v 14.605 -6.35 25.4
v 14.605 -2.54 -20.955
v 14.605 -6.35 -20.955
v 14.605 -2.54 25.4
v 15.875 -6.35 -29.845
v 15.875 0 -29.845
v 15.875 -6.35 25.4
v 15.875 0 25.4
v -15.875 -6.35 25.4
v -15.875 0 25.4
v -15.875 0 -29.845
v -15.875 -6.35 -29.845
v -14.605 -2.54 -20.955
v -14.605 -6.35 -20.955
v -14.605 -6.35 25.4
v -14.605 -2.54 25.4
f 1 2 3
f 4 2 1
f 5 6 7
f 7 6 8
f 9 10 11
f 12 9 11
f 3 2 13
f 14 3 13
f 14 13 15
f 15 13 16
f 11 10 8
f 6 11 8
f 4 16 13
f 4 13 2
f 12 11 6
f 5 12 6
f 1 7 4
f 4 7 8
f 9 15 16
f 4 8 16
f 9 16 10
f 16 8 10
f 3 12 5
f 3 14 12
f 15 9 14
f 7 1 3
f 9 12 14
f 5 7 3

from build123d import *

# Parameters (mm, degrees)
F0_W     = 29.21
F0_H     = 46.355
F1_DEPTH = 2.54
F0_H_2   = 4.445
F0_W_2   = 0.635
F2_DEPTH = 6.35


with BuildPart() as f1:
    # F0 (on Front) → F1 (new body)
    with BuildSketch(Plane.XZ):
        with Locations((0, 2.2225)):
            Rectangle(F0_W, F0_H)
    extrude(amount=F1_DEPTH)

    # F0 (on Front) → F2 (join)
    with BuildSketch(Plane.XZ):
        with Locations((0, -23.1775)):
            Rectangle(F0_W, F0_H_2)
        with Locations((14.9225, -23.1775)):
            Rectangle(F0_W_2, F0_H_2)
        with Locations((-14.9225, 2.2225)):
            Rectangle(F0_W_2, F0_H)
        with Locations((-15.5575, 2.2225)):
            Rectangle(F0_W_2, F0_H)
        with Locations((-15.5575, -23.1775)):
            Rectangle(F0_W_2, F0_H_2)
        with Locations((-14.9225, -23.1775)):
            Rectangle(F0_W_2, F0_H_2)
        Polygon((15.875, -25.4), (15.24, -25.4), (14.605, -25.4), (-14.605, -25.4), (-15.24, -25.4), (-15.875, -25.4), (-15.875, -29.845), (15.875, -29.845), align=None)
        with Locations((15.5575, -23.1775)):
            Rectangle(F0_W_2, F0_H_2)
        with Locations((15.5575, 2.2225)):
            Rectangle(F0_W_2, F0_H)
        with Locations((14.9225, 2.2225)):
            Rectangle(F0_W_2, F0_H)
    extrude(amount=F2_DEPTH)


solid = f1.part
